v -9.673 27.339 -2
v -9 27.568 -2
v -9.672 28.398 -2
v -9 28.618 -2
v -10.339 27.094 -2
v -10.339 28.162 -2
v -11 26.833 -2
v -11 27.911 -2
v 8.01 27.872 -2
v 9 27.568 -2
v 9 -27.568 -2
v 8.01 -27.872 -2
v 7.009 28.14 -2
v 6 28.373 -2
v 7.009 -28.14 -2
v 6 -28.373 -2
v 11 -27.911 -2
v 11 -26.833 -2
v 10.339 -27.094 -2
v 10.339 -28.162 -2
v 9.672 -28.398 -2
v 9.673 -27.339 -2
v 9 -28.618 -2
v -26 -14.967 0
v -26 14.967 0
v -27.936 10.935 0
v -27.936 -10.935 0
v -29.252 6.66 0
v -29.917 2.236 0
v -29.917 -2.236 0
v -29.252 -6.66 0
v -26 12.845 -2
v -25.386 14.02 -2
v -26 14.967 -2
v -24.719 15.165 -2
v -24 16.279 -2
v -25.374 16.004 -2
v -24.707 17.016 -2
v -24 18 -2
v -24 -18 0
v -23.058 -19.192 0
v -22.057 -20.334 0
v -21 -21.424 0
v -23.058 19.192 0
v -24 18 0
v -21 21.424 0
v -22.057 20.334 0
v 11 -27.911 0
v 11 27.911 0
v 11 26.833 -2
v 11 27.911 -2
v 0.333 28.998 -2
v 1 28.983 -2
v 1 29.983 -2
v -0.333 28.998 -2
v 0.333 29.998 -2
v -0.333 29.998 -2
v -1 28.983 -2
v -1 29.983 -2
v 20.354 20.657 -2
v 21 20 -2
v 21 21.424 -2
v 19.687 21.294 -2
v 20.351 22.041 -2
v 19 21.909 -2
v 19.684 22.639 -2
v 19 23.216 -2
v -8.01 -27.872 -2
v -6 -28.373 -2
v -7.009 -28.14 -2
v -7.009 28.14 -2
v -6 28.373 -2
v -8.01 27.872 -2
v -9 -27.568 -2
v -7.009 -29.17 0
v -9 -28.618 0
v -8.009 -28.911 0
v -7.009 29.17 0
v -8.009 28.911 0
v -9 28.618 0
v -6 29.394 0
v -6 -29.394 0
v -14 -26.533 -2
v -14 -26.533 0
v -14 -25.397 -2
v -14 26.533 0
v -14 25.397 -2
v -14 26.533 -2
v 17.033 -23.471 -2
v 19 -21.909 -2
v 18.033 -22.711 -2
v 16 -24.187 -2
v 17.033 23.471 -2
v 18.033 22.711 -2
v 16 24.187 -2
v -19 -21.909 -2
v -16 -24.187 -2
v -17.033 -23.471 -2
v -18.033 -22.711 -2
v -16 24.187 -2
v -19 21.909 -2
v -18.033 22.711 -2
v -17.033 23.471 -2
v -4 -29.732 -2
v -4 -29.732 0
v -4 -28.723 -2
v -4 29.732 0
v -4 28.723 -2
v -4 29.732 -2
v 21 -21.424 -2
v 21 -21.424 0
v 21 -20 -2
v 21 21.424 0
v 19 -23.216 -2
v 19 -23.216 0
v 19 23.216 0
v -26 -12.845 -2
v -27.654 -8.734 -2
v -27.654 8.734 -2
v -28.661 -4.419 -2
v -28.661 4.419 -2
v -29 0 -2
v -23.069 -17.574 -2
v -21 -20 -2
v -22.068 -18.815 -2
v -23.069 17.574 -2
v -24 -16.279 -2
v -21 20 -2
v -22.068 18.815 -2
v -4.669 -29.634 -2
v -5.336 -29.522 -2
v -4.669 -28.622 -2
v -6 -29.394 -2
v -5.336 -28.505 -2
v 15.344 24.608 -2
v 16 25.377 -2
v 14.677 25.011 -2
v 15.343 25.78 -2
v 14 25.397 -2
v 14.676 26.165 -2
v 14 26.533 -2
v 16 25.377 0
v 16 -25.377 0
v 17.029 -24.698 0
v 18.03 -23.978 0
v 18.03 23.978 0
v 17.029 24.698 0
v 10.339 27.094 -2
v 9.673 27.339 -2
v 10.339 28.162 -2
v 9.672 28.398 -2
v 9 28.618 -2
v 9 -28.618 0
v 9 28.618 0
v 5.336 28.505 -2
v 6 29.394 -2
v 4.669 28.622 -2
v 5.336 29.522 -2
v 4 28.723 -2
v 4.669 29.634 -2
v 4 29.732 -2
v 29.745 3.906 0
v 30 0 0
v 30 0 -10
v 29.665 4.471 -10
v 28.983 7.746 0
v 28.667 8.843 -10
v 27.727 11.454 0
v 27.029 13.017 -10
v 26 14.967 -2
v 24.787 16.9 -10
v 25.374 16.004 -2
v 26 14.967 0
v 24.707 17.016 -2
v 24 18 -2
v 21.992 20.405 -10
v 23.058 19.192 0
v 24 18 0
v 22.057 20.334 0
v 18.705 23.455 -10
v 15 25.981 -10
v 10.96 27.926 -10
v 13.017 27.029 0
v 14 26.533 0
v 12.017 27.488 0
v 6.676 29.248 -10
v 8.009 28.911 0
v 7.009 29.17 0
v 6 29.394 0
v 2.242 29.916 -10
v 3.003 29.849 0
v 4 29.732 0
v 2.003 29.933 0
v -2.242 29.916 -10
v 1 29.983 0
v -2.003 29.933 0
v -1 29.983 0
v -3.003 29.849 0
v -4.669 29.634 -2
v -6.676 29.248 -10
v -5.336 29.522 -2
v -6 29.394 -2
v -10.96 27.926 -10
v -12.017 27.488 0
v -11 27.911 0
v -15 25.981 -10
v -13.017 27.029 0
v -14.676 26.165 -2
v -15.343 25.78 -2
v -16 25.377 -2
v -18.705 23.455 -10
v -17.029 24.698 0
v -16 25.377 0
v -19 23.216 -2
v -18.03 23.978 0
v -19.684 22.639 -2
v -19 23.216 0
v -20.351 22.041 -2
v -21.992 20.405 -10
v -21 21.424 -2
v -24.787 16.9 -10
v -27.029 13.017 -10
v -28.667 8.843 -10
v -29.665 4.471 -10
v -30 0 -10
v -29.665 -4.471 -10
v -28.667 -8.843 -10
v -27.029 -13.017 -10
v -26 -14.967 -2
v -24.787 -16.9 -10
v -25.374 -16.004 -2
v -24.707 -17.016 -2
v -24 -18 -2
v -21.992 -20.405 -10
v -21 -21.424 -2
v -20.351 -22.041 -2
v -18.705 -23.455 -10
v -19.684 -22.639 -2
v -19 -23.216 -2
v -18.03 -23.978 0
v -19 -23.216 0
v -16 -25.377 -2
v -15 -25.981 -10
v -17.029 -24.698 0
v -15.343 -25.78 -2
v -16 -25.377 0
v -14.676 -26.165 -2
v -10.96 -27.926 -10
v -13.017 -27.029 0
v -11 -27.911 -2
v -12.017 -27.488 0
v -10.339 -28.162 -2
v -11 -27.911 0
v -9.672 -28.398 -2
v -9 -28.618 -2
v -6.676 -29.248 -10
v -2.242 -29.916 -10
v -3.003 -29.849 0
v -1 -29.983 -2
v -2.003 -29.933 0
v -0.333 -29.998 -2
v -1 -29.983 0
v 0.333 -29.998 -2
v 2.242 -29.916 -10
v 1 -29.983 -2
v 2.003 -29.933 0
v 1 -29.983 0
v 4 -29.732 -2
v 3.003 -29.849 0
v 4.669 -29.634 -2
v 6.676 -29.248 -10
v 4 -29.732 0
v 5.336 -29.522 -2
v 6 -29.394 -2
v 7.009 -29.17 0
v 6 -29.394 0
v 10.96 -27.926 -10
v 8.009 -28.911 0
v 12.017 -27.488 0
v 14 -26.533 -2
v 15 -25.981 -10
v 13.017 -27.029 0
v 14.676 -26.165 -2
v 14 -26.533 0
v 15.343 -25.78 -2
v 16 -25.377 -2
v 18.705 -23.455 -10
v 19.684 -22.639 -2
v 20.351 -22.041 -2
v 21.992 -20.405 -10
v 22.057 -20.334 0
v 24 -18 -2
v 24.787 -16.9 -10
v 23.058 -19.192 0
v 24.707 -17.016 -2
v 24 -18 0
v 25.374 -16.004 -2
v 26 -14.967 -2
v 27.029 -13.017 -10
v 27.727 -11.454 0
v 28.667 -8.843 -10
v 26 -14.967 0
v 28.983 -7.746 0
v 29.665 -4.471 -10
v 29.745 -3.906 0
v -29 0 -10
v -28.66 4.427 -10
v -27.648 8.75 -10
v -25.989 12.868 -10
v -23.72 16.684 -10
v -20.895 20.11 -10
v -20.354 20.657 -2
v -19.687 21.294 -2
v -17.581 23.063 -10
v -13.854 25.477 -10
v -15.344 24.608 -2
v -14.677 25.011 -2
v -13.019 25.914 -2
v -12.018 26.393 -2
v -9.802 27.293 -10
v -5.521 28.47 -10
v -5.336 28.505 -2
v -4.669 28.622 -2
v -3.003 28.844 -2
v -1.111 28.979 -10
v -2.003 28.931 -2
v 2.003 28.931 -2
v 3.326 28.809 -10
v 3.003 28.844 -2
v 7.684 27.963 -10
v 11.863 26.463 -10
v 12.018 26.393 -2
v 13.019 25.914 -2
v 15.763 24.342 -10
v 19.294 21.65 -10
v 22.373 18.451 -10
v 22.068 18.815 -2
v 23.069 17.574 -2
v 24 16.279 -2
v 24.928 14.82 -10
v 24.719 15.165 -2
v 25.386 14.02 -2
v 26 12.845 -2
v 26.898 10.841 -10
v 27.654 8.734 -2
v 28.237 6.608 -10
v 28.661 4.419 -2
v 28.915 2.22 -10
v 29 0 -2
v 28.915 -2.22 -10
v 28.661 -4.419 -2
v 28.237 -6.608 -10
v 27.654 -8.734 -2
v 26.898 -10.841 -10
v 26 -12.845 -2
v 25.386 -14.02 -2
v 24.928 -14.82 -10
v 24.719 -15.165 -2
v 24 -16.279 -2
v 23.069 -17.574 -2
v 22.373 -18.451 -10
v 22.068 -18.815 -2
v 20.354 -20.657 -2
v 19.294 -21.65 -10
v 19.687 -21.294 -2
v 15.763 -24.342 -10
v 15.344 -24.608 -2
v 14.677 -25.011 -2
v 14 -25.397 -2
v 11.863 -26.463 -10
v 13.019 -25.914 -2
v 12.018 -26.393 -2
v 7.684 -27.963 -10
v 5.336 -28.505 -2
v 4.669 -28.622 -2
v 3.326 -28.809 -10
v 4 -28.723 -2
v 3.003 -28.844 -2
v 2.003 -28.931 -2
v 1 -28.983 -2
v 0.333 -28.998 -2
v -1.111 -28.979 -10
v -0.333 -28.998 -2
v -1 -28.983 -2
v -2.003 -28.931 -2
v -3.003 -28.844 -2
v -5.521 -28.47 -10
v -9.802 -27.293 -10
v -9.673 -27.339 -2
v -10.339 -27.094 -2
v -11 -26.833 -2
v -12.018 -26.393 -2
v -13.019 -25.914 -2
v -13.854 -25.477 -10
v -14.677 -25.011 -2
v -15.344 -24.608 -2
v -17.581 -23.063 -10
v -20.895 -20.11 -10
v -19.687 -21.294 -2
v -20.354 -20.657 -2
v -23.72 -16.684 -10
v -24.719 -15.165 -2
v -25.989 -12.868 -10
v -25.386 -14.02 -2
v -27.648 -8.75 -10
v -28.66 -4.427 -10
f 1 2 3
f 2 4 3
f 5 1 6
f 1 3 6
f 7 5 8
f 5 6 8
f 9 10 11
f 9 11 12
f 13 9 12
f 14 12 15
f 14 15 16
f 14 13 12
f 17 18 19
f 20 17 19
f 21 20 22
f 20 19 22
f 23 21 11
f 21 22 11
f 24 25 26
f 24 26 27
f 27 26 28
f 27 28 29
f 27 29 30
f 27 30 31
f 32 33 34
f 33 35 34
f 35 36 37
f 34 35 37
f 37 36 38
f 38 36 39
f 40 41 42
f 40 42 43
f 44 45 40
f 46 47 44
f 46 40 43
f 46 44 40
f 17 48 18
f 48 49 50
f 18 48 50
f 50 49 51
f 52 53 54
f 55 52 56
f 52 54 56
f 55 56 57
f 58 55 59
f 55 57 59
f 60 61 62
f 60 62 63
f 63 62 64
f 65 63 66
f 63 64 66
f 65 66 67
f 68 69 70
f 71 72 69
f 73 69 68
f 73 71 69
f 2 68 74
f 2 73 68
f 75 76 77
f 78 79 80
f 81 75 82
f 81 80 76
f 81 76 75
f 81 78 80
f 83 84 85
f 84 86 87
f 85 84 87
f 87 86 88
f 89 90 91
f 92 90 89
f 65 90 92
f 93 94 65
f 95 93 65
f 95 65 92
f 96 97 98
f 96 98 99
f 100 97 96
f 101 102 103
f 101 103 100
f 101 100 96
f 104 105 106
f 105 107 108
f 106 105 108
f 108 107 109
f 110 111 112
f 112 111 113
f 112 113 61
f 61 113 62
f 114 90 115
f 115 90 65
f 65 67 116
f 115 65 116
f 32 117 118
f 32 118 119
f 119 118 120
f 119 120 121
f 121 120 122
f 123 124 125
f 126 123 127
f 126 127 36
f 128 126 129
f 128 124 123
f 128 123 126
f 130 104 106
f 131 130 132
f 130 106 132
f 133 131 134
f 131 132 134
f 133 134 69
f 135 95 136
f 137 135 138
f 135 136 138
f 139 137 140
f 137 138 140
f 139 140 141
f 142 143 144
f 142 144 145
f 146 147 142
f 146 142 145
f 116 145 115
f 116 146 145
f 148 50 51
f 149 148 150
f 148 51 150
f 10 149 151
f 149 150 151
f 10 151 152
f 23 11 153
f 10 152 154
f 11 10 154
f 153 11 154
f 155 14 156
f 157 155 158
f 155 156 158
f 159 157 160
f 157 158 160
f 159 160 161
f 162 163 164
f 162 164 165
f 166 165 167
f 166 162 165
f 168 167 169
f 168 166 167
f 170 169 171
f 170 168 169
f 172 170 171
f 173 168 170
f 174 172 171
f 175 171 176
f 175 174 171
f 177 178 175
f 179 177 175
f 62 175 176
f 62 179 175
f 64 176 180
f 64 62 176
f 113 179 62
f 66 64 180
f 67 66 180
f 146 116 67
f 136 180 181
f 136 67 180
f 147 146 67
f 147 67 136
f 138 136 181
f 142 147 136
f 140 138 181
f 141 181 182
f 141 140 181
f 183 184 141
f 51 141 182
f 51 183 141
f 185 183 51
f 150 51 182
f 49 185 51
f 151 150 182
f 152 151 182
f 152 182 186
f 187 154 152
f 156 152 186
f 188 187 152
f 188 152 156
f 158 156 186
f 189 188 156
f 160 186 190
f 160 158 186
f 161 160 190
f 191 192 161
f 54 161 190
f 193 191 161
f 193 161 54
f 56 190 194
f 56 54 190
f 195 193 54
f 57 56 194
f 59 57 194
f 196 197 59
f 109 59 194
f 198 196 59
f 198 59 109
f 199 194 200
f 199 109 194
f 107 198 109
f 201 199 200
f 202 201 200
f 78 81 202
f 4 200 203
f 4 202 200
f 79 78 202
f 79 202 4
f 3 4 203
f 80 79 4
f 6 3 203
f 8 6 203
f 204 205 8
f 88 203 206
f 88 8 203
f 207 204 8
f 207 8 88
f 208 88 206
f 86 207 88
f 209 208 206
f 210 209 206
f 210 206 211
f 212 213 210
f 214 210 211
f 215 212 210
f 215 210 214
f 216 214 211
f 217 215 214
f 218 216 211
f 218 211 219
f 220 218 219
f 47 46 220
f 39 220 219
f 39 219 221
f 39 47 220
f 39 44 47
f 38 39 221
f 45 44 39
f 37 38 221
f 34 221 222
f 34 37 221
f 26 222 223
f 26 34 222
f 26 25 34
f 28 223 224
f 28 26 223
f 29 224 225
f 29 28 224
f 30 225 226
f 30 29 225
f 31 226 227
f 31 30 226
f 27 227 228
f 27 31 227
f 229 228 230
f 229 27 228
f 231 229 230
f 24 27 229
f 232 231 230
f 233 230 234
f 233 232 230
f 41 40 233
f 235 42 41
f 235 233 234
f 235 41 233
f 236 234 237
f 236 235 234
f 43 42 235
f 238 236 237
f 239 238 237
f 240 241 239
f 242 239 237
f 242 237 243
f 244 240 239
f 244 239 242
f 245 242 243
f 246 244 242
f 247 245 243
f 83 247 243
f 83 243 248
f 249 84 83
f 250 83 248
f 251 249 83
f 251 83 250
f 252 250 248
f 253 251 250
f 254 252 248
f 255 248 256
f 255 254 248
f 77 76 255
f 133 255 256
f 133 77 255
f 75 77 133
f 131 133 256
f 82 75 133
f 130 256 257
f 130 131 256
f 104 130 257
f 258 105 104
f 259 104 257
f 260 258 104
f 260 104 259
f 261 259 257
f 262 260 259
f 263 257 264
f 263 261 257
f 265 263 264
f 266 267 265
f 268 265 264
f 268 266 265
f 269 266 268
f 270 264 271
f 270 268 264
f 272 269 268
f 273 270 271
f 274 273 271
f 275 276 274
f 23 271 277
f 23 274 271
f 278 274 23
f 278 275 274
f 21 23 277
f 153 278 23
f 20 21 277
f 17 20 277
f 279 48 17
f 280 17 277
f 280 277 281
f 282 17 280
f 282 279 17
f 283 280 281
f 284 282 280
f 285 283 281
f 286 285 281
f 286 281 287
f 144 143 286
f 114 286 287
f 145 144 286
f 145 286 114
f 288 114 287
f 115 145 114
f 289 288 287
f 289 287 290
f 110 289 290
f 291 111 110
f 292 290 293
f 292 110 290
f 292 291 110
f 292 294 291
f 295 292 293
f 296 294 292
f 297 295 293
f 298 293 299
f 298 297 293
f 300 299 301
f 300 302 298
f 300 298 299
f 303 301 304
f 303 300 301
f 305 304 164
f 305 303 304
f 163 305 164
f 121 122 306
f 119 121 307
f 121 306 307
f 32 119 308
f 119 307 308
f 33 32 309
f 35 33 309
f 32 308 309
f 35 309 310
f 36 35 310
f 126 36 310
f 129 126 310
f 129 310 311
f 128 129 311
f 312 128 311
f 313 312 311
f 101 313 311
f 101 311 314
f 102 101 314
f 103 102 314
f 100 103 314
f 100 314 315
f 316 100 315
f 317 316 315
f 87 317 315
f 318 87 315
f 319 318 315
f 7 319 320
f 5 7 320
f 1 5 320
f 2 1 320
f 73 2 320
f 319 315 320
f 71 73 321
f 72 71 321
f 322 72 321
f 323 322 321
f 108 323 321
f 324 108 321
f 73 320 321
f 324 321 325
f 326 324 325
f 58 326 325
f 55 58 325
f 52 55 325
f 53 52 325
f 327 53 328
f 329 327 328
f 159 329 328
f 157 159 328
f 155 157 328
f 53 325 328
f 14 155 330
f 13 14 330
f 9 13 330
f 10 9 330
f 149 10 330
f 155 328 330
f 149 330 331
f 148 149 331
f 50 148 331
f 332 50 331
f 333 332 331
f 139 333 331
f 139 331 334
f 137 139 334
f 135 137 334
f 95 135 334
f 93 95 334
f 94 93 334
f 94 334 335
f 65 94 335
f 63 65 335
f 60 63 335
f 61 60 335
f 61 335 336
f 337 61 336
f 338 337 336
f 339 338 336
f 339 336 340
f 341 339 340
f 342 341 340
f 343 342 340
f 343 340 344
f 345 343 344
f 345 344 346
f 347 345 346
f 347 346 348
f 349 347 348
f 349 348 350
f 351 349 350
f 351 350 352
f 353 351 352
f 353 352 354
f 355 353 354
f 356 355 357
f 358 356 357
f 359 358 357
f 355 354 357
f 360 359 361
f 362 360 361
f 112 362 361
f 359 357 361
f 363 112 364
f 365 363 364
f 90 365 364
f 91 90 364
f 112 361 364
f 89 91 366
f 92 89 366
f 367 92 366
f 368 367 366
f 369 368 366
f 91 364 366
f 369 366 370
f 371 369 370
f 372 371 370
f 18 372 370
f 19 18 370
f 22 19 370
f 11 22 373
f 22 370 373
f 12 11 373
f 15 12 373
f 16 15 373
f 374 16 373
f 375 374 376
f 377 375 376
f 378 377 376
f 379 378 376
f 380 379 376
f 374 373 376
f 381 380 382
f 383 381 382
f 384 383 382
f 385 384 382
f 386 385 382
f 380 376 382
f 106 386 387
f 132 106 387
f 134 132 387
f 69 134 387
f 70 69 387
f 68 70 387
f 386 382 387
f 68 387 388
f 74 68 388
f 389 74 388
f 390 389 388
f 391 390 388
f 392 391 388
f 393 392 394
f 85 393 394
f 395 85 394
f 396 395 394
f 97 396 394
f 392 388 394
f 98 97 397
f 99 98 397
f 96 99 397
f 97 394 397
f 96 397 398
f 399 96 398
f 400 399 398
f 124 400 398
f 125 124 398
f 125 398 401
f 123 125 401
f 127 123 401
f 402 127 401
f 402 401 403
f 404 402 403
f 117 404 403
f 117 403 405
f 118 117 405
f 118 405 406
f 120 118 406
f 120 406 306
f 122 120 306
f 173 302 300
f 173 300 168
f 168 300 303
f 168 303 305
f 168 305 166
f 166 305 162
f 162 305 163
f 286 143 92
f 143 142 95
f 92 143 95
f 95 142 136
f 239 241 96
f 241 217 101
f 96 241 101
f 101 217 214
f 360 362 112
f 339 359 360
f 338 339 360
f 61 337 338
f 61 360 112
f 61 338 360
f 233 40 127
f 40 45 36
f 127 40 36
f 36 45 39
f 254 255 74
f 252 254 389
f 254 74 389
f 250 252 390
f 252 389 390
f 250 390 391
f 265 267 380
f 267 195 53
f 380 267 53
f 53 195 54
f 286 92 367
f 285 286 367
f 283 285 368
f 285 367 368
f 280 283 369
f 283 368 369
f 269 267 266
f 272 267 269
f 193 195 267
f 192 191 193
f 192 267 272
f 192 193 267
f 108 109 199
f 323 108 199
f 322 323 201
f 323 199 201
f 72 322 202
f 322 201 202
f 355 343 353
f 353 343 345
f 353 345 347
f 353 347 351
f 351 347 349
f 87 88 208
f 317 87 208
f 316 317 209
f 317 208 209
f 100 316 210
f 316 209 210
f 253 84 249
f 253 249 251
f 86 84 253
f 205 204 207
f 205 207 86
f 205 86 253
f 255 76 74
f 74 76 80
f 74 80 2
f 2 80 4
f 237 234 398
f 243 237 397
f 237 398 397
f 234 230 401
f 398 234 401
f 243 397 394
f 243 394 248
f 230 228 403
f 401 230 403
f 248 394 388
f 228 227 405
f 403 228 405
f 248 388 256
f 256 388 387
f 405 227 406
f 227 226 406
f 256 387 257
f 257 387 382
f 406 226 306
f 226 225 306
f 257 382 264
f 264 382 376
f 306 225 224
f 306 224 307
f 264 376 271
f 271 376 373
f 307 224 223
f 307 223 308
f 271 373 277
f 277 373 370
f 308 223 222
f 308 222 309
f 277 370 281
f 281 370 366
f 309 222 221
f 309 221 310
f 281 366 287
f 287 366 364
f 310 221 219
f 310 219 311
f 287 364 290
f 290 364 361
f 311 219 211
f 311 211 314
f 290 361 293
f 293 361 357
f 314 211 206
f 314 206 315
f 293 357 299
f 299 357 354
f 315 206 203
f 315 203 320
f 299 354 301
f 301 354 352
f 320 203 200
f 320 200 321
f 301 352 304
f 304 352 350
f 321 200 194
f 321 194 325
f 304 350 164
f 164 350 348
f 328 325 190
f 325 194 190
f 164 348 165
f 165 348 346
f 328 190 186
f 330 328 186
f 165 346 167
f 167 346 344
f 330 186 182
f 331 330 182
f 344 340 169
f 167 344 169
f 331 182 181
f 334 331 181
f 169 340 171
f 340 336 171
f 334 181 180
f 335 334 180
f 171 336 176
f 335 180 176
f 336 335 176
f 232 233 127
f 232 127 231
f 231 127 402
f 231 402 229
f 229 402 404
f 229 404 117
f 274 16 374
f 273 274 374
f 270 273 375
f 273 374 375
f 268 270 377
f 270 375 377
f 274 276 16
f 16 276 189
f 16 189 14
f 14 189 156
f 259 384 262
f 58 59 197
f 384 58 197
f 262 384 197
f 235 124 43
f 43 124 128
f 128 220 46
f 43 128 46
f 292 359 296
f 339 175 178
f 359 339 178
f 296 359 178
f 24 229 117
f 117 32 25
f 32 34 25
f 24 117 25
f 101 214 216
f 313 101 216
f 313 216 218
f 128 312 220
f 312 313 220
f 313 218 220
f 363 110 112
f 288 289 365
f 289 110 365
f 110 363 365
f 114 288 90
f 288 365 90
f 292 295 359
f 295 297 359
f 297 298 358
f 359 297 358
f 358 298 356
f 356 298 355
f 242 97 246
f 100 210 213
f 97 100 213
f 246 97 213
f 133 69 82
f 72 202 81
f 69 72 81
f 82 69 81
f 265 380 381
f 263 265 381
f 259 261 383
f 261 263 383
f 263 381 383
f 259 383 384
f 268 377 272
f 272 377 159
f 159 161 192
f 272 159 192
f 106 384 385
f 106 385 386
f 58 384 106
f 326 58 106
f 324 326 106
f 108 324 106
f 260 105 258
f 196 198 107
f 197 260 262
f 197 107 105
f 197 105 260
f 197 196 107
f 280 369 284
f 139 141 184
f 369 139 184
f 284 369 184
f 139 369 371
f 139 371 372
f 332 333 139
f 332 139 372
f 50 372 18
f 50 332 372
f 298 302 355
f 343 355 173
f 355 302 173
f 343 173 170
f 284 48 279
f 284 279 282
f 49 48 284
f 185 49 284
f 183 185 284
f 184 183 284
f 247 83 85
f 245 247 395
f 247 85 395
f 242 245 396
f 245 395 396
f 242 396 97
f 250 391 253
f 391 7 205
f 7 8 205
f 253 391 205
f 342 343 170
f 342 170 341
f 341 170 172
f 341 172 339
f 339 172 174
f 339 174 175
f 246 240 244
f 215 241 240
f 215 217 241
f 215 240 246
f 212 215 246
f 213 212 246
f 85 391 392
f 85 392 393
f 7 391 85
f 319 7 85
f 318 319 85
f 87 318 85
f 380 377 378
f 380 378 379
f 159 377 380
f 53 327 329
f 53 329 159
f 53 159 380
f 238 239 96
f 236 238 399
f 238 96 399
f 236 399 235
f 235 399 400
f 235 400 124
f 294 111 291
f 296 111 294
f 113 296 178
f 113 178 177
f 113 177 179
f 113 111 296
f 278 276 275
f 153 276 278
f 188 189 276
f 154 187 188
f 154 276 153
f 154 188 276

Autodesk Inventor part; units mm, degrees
ref_plane "YZ Plane" through (0, 0, 0) normal (1, 0, 0) x (0, 1, 0)
ref_plane "XY Plane" through (0, 0, 0) normal (0, 0, 1) x (1, 0, 0)
sketch "Sketch1" plane through (0, 0, 0) normal (0, 0, 1) x (1, 0, 0)
  circle A0 centre (0, 0) radius 30
  dimension "d0" = 60
extrude "Extrusion1" add sketch "Sketch1" against normal blind 10
sketch "Sketch2" plane through (0, 0, -10) normal (0, 0, -1) x (-1, 0, 0)
  circle A0 centre (0, 0) radius 29
  dimension "d3" = 58
extrude "Extrusion2" cut sketch "Sketch2" against normal blind 8
ref_plane "Work Plane1" through (0, 30, 0) normal (0, 1, 0) x (-1, 0, 0)
sketch "Sketch3" plane through (0, 30, 0) normal (0, 1, 0) x (-1, 0, 0)
  line L0 (30, 0) -> (30, -10) projected
  line L1 (30, 0) -> (26, 0)
  line L2 (30, 0) -> (-30, 0) projected
  line L3 (26, 0) -> (24, 0)
  line L4 (24, 0) -> (24, -2)
  line L5 (24, -2) -> (26, -2)
  line L6 (26, -2) -> (26, 0)
  line L7 (24, 0) -> (21, 0)
  line L8 (21, 0) -> (19, 0)
  line L9 (19, 0) -> (19, -2)
  line L10 (19, -2) -> (21, -2)
  line L11 (21, -2) -> (21, 0)
  line L12 (19, 0) -> (16, 0)
  line L13 (16, 0) -> (14, 0)
  line L14 (14, 0) -> (14, -2)
  line L15 (14, -2) -> (16, -2)
  line L16 (16, -2) -> (16, 0)
  line L17 (14, 0) -> (11, 0)
  line L18 (11, 0) -> (9, 0)
  line L19 (9, 0) -> (9, -2)
  line L20 (9, -2) -> (11, -2)
  line L21 (11, -2) -> (11, 0)
  line L22 (9, 0) -> (6, 0)
  line L23 (6, 0) -> (4, 0)
  line L24 (4, 0) -> (4, -2)
  line L25 (4, -2) -> (6, -2)
  line L26 (6, -2) -> (6, 0)
  line L27 (4, 0) -> (1, 0)
  line L28 (1, 0) -> (-1, 0)
  line L29 (-1, 0) -> (-1, -2)
  line L30 (-1, -2) -> (1, -2)
  line L31 (1, -2) -> (1, 0)
  line L32 (-1, 0) -> (-4, 0)
  line L33 (-4, 0) -> (-6, 0)
  line L34 (-6, 0) -> (-6, -2)
  line L35 (-6, -2) -> (-4, -2)
  line L36 (-4, -2) -> (-4, 0)
  line L37 (-6, 0) -> (-9, 0)
  line L38 (-9, 0) -> (-11, 0)
  line L39 (-11, 0) -> (-11, -2)
  line L40 (-11, -2) -> (-9, -2)
  line L41 (-9, -2) -> (-9, 0)
  line L42 (-11, 0) -> (-14, 0)
  line L43 (-14, 0) -> (-16, 0)
  line L44 (-16, 0) -> (-16, -2)
  line L45 (-16, -2) -> (-14, -2)
  line L46 (-14, -2) -> (-14, 0)
  line L47 (-16, 0) -> (-19, 0)
  line L48 (-19, 0) -> (-21, 0)
  line L49 (-21, 0) -> (-21, -2)
  line L50 (-21, -2) -> (-19, -2)
  line L51 (-19, -2) -> (-19, 0)
  line L52 (-21, 0) -> (-24, 0)
  line L53 (-24, 0) -> (-26, 0)
  line L54 (-26, 0) -> (-26, -2)
  line L55 (-26, -2) -> (-24, -2)
  line L56 (-24, -2) -> (-24, 0)
  point P0 (0, 0)
  dimension "d7" = 4
  dimension "d8" = 2
  dimension "d9" = 2
  dimension "d10" = 3
  dimension "d11" = 2
  dimension "d12" = 2
  dimension "d13" = 3
  dimension "d14" = 2
  dimension "d15" = 2
  dimension "d16" = 3
  dimension "d17" = 2
  dimension "d18" = 2
  dimension "d19" = 3
  dimension "d20" = 2
  dimension "d21" = 2
  dimension "d22" = 3
  dimension "d23" = 2
  dimension "d24" = 2
  dimension "d25" = 3
  dimension "d26" = 2
  dimension "d27" = 2
  dimension "d28" = 3
  dimension "d29" = 2
  dimension "d30" = 2
  dimension "d31" = 3
  dimension "d32" = 2
  dimension "d33" = 2
  dimension "d34" = 3
  dimension "d35" = 2
  dimension "d36" = 2
  dimension "d37" = 3
  dimension "d38" = 2
  dimension "d39" = 2
extrude "Extrusion3" cut sketch "Sketch3" against normal through all
properties part number "fan front"
